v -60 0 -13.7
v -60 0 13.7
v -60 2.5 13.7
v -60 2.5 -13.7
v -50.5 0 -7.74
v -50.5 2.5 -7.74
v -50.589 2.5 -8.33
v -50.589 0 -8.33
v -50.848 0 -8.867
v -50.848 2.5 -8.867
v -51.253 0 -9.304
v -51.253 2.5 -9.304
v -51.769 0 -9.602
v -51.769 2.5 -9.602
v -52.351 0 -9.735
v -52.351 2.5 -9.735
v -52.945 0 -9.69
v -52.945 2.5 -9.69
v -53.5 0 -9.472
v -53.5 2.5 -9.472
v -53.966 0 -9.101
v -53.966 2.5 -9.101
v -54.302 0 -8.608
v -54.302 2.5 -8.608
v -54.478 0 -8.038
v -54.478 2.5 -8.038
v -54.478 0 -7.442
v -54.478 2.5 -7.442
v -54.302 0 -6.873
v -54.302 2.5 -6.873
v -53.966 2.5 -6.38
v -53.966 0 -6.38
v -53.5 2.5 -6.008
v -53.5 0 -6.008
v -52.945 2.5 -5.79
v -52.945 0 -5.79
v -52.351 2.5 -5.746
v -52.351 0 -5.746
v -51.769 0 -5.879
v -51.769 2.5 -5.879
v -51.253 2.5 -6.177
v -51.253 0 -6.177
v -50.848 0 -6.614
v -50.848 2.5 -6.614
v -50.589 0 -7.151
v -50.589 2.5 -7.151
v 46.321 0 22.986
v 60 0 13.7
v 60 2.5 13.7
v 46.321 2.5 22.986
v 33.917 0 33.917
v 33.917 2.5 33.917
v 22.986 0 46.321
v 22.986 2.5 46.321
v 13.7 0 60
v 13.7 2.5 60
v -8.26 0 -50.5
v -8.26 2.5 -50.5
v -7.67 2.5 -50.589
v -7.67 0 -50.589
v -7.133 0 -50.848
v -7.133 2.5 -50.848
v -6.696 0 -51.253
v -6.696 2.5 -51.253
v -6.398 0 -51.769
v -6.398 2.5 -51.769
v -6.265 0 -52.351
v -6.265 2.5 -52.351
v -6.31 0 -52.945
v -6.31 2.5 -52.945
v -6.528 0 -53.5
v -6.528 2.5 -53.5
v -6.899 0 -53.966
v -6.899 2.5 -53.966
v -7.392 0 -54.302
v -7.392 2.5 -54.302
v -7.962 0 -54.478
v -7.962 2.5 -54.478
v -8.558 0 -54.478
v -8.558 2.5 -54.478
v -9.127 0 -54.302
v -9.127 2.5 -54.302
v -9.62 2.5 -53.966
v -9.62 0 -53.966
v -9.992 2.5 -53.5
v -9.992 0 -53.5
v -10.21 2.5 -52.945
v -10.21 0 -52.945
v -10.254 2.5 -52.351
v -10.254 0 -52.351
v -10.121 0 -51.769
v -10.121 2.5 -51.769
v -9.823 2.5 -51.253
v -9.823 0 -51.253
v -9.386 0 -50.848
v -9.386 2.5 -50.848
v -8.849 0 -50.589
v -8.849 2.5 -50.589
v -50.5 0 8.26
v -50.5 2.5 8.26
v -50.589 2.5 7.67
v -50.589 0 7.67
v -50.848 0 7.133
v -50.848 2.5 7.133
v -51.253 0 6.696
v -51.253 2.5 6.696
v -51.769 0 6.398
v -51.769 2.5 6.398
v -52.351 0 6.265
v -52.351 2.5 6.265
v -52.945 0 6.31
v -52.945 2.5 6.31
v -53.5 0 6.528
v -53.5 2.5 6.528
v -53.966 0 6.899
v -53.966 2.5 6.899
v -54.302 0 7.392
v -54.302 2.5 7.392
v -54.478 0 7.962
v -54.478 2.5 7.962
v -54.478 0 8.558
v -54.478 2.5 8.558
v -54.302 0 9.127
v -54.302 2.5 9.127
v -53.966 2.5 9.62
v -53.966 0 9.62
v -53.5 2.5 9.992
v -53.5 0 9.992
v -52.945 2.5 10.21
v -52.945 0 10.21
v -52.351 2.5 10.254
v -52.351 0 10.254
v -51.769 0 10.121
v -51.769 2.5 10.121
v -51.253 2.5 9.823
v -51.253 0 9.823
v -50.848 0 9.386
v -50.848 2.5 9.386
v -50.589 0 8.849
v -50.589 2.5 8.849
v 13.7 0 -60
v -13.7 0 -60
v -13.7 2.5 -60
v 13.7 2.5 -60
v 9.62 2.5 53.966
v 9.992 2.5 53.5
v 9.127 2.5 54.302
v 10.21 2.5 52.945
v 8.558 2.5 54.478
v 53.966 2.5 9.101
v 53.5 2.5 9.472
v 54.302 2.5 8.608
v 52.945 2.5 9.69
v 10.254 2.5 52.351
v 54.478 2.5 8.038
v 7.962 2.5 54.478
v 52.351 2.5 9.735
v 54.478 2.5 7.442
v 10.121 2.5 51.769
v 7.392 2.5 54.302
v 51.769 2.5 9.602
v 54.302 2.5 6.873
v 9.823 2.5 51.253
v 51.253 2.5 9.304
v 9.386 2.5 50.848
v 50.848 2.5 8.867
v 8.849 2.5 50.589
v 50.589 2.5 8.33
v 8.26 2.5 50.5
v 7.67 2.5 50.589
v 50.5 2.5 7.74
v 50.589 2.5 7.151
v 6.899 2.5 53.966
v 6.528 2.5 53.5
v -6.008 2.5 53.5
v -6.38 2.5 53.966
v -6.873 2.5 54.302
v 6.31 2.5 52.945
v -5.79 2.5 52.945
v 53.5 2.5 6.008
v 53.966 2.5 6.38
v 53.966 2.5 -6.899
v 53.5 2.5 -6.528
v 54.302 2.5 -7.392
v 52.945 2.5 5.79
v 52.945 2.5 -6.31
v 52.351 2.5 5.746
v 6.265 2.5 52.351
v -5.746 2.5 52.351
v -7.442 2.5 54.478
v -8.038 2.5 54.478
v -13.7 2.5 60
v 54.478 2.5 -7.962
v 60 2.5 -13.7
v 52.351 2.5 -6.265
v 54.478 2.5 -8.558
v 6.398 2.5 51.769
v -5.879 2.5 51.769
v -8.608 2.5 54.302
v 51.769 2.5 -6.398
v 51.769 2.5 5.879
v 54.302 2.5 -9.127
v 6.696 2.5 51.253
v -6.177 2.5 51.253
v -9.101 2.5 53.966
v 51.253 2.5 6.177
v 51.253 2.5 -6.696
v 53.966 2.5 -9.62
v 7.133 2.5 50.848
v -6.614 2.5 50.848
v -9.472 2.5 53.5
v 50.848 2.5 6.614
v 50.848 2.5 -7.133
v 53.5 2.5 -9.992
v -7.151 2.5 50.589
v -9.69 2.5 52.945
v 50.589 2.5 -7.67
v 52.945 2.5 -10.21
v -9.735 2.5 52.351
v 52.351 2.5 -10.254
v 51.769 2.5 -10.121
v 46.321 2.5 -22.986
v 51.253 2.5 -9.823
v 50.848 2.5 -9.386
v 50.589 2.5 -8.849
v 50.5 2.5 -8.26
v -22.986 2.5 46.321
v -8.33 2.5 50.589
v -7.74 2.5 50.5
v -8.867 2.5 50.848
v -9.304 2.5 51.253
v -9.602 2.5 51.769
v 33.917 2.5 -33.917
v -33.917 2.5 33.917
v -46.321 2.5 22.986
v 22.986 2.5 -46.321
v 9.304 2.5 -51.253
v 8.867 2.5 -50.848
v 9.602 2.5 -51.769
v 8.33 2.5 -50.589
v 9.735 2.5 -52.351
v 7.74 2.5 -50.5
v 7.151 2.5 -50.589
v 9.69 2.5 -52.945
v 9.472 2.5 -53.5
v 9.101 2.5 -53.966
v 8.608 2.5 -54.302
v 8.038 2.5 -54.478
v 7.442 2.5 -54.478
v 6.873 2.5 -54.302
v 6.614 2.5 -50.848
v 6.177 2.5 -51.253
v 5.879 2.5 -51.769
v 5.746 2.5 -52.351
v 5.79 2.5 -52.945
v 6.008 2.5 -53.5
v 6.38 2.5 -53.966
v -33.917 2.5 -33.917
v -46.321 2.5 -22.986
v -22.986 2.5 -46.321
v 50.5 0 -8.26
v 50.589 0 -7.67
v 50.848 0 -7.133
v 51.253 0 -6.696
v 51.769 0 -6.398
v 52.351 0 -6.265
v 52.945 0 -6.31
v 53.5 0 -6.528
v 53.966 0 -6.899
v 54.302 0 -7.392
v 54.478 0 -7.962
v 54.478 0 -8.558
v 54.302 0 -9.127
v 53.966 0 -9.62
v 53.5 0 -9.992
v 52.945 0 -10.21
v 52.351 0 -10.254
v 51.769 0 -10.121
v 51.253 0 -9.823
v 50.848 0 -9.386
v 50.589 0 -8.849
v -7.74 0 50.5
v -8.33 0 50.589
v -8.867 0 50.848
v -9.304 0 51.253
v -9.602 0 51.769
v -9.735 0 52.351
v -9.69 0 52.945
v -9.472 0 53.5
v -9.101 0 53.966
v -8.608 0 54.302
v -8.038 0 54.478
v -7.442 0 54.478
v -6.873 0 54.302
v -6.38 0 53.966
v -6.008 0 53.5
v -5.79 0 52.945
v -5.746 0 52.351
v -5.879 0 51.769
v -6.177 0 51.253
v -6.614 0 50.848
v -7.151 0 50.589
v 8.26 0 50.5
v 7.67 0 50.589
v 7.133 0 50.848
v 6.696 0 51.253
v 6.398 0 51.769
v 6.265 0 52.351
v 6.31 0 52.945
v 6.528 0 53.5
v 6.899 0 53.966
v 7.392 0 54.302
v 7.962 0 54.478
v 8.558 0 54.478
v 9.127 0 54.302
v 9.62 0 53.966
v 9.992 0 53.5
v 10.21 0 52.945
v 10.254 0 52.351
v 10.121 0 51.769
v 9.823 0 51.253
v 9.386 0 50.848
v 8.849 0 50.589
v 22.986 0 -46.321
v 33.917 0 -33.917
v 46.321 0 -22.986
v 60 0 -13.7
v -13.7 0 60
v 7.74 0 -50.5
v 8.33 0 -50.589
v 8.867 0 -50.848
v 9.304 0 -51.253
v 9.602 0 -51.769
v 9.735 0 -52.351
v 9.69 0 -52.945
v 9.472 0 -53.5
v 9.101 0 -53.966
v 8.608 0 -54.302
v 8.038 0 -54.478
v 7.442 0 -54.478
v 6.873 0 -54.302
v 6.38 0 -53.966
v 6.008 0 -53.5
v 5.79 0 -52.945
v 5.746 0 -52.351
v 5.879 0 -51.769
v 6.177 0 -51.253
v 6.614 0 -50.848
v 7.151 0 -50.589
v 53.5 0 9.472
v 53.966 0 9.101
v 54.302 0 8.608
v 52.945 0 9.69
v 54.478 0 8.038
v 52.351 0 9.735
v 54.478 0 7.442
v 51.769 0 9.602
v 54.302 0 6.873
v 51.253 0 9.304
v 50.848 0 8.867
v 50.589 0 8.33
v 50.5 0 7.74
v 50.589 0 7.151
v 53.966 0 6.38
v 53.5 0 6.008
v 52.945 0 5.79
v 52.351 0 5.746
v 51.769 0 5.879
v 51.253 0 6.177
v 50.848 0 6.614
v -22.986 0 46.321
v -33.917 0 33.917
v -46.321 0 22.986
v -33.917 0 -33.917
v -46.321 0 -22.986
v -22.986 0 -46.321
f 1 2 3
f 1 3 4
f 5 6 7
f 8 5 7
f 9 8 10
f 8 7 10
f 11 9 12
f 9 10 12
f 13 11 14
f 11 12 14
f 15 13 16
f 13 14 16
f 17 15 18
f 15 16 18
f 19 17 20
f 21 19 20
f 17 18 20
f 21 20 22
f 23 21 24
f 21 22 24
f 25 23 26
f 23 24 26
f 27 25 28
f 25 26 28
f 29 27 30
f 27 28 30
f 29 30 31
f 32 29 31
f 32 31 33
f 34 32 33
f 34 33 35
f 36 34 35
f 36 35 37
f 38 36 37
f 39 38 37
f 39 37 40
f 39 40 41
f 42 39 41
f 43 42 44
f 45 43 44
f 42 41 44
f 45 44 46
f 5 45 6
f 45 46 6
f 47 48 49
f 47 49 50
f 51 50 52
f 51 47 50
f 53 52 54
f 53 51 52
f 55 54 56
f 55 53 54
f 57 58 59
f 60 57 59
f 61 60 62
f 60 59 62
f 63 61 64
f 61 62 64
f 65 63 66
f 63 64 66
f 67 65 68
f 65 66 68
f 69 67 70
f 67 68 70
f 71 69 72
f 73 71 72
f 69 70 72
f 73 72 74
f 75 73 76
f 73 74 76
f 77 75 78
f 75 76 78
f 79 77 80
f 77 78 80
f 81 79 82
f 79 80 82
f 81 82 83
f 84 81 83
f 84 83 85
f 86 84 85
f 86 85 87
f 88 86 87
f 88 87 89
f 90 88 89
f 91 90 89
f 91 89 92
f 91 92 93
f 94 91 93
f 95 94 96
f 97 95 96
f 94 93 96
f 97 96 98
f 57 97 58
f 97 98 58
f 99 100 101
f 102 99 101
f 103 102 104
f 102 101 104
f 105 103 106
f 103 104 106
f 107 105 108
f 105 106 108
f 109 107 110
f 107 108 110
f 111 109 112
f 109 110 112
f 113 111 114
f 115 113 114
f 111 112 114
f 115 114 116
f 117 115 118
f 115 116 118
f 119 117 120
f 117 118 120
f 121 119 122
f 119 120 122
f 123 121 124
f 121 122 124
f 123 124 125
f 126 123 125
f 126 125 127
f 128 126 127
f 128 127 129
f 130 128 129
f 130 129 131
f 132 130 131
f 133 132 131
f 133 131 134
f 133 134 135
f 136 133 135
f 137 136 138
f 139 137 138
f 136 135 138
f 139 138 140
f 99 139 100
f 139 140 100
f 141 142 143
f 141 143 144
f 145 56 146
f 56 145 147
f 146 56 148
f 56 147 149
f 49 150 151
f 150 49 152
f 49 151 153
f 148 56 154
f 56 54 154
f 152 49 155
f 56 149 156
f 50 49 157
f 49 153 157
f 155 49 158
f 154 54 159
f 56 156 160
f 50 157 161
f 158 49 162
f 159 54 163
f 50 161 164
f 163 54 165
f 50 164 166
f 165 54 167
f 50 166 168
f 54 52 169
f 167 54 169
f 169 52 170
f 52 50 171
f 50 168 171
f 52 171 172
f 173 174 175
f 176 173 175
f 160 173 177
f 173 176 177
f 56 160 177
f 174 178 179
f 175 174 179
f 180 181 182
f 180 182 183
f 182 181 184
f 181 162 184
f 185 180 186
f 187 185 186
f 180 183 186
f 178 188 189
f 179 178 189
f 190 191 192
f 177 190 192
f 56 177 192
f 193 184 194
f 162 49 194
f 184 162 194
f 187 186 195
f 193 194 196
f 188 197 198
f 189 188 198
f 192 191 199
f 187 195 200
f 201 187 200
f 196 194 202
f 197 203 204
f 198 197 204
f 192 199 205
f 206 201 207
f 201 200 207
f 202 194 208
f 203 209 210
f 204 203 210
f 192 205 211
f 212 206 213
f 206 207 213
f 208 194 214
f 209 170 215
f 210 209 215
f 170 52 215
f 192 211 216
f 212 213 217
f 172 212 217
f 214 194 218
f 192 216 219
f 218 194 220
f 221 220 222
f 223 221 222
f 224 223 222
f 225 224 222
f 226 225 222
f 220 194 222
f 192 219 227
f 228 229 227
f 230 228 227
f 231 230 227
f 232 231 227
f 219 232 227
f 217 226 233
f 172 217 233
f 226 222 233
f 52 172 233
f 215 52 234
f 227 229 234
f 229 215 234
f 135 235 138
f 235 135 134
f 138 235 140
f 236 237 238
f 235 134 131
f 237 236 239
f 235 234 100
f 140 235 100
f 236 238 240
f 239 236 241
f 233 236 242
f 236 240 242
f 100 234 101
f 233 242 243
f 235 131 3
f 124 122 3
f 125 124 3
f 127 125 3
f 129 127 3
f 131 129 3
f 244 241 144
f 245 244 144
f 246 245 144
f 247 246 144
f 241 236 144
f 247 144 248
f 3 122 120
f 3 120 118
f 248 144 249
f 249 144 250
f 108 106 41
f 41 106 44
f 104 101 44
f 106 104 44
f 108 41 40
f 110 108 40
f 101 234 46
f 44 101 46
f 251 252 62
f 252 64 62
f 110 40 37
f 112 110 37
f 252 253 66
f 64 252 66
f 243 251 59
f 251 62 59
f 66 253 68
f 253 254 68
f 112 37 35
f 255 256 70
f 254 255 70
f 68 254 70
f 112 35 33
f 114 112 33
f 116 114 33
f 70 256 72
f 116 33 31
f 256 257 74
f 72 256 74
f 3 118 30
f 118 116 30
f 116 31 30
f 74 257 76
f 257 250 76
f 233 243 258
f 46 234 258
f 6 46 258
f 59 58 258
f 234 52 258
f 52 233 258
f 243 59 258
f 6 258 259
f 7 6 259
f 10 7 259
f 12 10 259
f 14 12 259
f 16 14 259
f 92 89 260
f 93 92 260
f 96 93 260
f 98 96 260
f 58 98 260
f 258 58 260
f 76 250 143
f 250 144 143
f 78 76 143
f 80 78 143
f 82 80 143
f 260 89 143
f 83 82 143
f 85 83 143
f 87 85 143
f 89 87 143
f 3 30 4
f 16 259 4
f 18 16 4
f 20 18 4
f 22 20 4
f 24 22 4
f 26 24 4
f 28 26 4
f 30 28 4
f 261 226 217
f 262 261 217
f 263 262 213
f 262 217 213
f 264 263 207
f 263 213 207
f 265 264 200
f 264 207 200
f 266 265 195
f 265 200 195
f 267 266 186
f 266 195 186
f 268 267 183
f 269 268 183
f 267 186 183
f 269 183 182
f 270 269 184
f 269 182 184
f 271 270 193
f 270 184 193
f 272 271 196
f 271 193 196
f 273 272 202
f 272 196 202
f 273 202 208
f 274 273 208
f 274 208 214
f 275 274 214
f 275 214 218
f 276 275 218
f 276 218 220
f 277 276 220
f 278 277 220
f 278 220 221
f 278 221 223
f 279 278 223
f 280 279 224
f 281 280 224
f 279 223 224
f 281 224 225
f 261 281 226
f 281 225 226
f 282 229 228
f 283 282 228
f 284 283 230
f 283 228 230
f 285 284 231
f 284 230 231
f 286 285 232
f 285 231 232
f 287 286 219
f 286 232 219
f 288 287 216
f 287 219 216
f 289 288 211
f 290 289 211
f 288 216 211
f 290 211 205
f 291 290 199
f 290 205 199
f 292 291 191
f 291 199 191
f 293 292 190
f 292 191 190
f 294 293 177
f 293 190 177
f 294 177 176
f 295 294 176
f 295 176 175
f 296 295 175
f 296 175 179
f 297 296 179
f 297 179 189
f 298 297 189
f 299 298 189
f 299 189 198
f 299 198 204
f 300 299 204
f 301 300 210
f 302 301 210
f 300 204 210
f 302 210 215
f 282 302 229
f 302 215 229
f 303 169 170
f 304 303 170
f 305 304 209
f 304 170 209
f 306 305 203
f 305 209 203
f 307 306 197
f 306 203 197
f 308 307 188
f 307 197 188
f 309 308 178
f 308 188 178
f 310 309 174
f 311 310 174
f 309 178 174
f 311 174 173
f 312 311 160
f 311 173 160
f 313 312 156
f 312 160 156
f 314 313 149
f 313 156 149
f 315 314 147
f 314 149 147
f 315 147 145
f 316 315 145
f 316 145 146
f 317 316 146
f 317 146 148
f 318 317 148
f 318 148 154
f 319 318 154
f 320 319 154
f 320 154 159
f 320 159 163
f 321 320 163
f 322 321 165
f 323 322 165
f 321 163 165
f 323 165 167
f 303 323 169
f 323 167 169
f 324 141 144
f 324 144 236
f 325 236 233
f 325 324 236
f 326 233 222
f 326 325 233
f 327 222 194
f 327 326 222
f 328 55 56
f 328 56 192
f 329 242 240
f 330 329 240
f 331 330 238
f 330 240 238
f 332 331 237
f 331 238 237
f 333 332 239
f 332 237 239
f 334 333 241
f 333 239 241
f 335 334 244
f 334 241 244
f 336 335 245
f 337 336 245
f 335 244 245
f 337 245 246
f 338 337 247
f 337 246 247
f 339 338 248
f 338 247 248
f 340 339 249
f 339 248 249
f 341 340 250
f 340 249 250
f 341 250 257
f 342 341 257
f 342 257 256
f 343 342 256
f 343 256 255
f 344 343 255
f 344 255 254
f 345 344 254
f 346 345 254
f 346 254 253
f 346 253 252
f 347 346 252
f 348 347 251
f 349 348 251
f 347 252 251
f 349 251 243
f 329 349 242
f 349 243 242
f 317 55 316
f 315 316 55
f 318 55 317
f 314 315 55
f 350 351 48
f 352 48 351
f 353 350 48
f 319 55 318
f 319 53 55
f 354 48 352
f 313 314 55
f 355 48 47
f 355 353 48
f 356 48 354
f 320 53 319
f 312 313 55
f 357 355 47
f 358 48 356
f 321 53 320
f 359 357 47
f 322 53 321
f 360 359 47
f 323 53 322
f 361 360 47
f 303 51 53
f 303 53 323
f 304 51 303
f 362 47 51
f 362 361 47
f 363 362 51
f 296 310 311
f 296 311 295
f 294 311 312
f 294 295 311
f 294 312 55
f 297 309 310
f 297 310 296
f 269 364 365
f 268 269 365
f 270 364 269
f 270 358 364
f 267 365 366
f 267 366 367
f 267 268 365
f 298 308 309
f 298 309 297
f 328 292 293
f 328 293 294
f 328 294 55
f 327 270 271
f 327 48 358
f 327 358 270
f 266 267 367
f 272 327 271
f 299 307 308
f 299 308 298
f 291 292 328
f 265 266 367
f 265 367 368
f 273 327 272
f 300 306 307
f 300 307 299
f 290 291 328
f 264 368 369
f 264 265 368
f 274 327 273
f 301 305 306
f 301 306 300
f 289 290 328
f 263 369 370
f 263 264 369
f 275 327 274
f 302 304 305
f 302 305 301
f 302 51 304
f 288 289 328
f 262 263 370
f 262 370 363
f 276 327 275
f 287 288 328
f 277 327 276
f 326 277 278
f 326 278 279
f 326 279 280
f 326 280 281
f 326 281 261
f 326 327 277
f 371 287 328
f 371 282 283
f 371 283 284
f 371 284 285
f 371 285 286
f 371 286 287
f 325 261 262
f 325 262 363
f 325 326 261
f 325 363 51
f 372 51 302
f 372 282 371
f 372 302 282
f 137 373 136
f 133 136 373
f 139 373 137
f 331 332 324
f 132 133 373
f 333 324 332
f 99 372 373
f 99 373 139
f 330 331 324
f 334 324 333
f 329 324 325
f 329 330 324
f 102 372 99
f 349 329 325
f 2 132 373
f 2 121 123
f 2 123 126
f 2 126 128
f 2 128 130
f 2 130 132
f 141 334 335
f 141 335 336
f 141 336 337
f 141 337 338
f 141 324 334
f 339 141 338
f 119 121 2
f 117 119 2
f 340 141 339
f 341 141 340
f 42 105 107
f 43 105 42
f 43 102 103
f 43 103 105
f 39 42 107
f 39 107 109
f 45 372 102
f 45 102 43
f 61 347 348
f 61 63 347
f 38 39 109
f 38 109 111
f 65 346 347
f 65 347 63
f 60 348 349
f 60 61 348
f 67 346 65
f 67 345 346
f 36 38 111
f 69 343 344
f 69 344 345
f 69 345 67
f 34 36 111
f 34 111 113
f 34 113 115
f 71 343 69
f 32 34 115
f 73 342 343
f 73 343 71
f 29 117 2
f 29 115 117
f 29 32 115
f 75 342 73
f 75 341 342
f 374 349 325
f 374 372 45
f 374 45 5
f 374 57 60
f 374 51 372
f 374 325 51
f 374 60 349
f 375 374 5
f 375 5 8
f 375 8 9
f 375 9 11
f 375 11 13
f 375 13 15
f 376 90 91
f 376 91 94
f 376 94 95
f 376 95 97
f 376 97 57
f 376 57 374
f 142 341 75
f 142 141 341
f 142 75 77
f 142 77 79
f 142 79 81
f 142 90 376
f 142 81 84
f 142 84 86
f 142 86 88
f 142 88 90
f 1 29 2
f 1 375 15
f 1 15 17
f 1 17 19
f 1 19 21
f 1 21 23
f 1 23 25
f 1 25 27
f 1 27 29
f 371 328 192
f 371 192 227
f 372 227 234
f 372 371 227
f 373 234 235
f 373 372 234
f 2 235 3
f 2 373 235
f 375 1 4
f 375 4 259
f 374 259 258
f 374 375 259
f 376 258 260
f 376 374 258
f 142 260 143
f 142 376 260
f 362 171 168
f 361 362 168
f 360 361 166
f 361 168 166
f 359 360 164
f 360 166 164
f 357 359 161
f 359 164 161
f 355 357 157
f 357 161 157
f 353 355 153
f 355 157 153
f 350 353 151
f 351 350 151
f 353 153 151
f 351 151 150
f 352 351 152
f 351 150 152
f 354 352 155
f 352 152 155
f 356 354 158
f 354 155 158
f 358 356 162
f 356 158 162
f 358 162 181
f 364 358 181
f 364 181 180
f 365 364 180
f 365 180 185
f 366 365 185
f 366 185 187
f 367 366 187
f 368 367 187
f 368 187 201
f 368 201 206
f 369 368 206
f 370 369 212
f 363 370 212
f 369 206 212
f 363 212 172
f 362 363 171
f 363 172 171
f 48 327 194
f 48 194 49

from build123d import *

# Parameters (mm, degrees)
BOSS_EXTRUDE1_DEPTH = 2.5
SKETCH3_R           = 2
CUT_EXTRUDE1_DEPTH  = 2.5
CIRPATTERN1_COUNT   = 4


with BuildPart() as part:
    # Sketch1 → Boss-Extrude1 (new body)
    with BuildSketch(Plane(origin=(0, 0, 0), x_dir=(1, 0, 0), z_dir=(0, 1, 0))):
        with BuildLine():
            Line((-13.7, 60), (13.7, 60))
            ThreePointArc((13.7, 60), (33.917107936, 33.917107936), (60, 13.7))
            Line((60, 13.7), (60, -13.7))
            ThreePointArc((60, -13.7), (33.917107936, -33.917107936), (13.7, -60))
            Line((13.7, -60), (-13.7, -60))
            ThreePointArc((-13.7, -60), (-33.917107936, -33.917107936), (-60, -13.7))
            Line((-60, -13.7), (-60, 13.7))
            ThreePointArc((-60, 13.7), (-33.917107936, 33.917107936), (-13.7, 60))
        make_face()
    extrude(amount=BOSS_EXTRUDE1_DEPTH)

    # Sketch3 → Cut-Extrude1 (cut)
    with BuildSketch(Plane(origin=(0, 2.5, 0), x_dir=(1, 0, 0), z_dir=(0, 1, 0))):
        with Locations((-8.259716624, 52.5)):
            Circle(SKETCH3_R)
        with Locations((7.740283376, 52.5)):
            Circle(SKETCH3_R)
    cut_extrude1 = extrude(amount=-CUT_EXTRUDE1_DEPTH, mode=Mode.SUBTRACT)

    # CirPattern1: Cut-Extrude1 ×4 about axis
    cirpattern1_axis = Axis((0, 0, 0), (0, 1, 0))
    for i in range(1, CIRPATTERN1_COUNT):
        add(cut_extrude1.rotate(cirpattern1_axis, i * 360 / CIRPATTERN1_COUNT), mode=Mode.SUBTRACT)


solid = part.part
